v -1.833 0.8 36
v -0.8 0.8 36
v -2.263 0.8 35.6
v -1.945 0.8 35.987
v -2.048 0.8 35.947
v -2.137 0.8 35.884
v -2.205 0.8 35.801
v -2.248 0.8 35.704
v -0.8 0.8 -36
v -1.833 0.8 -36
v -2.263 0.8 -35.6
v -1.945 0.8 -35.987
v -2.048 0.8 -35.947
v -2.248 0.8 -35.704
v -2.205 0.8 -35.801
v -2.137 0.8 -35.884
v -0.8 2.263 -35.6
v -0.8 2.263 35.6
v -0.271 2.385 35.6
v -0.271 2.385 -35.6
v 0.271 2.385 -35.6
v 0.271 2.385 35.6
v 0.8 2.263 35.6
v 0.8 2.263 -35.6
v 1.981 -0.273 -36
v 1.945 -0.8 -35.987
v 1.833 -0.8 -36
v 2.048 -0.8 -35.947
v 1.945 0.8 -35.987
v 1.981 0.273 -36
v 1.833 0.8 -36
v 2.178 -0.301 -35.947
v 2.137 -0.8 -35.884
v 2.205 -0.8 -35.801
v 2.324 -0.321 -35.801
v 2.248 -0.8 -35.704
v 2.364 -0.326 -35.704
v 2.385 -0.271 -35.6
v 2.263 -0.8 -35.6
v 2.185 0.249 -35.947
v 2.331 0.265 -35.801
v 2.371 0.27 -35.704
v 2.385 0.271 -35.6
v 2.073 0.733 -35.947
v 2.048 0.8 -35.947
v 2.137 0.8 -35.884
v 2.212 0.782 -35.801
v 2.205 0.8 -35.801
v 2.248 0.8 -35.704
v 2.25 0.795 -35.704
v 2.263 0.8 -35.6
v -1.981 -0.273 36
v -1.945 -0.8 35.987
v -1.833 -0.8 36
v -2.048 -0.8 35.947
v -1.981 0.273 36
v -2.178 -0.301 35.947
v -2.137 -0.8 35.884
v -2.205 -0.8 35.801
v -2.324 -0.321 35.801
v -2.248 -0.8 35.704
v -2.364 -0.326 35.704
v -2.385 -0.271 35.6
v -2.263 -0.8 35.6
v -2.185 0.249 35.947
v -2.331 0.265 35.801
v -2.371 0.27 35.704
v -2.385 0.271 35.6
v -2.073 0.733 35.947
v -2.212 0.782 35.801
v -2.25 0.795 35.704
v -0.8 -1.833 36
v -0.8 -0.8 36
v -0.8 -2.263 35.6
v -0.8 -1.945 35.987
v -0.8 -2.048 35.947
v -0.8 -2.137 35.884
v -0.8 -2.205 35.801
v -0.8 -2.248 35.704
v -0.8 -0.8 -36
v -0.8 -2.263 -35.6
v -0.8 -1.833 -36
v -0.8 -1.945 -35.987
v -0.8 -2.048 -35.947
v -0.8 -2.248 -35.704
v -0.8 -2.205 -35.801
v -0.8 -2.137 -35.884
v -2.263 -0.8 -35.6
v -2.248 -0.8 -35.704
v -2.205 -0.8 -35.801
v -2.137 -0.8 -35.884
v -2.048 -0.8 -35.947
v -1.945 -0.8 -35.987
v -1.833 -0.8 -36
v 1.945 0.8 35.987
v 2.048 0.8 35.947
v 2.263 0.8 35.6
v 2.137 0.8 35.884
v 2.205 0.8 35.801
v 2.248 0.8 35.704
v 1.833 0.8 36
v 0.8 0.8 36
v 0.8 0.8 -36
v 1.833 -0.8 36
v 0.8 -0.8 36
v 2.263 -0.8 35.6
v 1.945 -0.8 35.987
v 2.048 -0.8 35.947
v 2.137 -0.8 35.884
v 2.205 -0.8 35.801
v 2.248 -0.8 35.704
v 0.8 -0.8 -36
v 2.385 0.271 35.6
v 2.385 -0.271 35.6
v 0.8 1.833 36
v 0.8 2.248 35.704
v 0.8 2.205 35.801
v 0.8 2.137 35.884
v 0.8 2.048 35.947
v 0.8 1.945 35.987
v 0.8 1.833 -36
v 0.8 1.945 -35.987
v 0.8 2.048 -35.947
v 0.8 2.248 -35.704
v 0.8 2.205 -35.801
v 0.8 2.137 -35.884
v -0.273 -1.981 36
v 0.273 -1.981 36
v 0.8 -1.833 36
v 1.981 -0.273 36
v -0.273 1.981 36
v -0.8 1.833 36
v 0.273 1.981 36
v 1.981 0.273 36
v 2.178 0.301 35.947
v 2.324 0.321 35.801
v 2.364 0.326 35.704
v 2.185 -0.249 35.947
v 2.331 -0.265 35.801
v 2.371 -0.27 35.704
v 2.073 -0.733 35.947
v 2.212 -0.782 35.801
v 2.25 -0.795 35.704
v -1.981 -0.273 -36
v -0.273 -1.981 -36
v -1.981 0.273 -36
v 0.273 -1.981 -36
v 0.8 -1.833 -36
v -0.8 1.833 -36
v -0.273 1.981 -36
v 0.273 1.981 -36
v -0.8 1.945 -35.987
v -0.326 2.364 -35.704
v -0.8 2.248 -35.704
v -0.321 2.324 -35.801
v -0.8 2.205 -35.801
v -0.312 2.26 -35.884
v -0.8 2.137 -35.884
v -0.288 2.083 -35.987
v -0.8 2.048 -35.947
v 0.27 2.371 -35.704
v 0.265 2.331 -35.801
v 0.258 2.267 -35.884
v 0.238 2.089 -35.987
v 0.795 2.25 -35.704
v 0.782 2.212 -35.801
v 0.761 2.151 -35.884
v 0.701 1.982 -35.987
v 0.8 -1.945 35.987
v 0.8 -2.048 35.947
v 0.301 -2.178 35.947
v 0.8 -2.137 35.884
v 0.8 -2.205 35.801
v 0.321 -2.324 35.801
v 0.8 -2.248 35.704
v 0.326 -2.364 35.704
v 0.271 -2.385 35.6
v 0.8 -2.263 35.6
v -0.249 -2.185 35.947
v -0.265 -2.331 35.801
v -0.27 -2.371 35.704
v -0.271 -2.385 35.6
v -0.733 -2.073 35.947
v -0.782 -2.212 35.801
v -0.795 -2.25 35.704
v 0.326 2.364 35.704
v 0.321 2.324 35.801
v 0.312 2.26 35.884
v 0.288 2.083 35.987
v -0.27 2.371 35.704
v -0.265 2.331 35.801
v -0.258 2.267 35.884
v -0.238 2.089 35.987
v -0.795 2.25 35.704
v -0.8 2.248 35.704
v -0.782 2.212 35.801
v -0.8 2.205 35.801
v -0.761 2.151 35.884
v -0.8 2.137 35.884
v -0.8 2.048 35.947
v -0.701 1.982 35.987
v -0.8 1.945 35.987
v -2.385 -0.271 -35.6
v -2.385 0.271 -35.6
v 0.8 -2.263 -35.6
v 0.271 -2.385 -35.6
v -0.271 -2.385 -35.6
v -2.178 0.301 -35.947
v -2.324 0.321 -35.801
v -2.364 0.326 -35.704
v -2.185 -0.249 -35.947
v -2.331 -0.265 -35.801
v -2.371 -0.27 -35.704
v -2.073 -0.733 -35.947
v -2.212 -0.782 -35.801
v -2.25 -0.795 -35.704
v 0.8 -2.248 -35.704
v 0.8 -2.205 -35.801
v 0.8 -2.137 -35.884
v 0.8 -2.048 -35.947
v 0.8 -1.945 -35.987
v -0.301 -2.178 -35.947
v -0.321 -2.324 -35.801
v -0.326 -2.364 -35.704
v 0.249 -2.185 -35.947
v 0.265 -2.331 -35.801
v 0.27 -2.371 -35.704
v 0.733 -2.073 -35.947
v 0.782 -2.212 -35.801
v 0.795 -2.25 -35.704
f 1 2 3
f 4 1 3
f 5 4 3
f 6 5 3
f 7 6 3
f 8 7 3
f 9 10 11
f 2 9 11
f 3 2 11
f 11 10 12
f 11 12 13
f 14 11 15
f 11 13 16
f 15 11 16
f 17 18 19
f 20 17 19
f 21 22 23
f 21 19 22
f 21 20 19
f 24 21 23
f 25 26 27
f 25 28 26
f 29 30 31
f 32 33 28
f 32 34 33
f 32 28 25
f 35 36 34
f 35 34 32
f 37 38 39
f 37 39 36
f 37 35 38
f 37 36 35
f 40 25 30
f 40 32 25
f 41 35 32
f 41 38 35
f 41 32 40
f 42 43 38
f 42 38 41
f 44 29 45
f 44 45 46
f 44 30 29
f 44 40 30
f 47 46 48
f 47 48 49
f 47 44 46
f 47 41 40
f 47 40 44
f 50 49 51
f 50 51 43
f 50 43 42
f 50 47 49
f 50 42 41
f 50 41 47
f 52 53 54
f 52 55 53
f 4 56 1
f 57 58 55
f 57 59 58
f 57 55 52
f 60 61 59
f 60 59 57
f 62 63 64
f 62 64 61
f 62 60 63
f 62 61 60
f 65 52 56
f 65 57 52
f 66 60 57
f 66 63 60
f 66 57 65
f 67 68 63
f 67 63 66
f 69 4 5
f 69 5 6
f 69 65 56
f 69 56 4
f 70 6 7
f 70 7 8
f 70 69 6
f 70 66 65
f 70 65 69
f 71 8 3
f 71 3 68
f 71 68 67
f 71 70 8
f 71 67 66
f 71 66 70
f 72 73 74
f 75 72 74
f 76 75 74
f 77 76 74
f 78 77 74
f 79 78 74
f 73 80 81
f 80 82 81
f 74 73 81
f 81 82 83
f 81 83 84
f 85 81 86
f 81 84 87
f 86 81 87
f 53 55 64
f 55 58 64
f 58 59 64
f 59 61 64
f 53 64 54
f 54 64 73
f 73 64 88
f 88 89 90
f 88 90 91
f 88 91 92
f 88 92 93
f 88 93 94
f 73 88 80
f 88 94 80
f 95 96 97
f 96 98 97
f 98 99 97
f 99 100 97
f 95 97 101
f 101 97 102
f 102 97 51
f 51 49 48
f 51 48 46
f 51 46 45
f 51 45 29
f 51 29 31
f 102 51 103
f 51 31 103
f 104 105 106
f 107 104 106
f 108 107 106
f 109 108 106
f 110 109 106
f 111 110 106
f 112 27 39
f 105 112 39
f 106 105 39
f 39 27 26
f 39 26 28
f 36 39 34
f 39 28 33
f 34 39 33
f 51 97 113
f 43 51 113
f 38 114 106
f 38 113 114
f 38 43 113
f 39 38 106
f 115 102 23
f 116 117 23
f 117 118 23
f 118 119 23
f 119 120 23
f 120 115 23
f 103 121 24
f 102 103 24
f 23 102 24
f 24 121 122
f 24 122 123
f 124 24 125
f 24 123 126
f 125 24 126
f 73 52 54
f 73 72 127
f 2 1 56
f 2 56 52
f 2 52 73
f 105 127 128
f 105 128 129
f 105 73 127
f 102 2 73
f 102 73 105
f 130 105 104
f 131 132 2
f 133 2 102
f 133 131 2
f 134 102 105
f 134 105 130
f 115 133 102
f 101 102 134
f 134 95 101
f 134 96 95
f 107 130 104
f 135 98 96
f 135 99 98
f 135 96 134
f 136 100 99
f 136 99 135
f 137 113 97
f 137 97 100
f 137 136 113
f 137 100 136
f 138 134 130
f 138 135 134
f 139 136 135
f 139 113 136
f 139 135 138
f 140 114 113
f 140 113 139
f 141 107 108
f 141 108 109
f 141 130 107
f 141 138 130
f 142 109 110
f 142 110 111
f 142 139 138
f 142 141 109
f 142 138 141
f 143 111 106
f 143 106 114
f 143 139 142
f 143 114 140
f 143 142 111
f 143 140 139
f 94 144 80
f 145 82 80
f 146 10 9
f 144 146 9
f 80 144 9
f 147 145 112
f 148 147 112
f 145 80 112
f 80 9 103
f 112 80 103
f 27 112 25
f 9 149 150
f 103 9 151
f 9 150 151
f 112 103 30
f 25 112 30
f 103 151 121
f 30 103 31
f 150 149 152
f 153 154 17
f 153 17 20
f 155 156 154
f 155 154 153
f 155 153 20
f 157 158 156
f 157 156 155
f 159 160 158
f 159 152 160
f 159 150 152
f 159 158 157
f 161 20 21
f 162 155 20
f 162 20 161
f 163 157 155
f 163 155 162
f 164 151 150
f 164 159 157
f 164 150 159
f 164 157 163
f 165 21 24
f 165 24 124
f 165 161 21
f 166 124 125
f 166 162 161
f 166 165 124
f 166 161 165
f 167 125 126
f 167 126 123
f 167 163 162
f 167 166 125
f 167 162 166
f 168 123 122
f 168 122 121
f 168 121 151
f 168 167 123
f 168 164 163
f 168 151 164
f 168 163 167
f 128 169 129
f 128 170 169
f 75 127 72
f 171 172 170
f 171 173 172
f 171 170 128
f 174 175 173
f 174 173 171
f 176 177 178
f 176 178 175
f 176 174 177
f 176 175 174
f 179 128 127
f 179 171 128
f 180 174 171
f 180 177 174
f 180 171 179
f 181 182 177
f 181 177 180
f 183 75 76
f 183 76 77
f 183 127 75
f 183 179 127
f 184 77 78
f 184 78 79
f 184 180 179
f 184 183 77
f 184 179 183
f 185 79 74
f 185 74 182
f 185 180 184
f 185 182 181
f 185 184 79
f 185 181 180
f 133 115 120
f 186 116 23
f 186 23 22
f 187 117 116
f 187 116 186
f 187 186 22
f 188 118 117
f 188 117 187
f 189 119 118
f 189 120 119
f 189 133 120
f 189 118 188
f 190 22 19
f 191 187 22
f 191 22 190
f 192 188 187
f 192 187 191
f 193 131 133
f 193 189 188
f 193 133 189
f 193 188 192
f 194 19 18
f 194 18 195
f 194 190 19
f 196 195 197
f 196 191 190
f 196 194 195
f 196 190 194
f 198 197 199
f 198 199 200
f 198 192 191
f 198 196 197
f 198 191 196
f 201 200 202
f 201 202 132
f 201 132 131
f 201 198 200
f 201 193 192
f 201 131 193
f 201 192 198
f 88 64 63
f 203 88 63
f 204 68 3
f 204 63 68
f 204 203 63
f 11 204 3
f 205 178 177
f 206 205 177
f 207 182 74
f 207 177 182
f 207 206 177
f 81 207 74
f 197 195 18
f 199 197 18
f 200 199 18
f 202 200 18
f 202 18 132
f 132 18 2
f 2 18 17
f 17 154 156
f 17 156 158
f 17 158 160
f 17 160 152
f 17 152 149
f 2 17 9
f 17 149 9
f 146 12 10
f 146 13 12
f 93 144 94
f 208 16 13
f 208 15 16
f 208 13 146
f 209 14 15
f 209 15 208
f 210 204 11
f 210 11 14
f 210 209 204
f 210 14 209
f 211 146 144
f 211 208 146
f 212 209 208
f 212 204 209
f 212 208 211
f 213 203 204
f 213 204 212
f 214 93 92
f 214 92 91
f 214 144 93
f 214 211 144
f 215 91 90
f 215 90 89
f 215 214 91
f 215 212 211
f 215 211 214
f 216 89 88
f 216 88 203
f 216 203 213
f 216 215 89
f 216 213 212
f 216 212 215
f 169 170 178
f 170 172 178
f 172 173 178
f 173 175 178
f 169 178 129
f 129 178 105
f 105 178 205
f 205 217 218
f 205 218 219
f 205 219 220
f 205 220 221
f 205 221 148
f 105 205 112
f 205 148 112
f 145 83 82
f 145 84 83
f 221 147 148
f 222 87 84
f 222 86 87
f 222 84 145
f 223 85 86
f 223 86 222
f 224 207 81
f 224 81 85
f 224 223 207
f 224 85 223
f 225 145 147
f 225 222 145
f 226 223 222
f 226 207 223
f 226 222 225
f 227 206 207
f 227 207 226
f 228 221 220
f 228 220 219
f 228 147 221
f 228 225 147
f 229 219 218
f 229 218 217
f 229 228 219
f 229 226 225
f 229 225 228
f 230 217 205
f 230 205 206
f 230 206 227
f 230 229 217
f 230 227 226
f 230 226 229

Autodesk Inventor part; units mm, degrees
ref_plane "YZ Plane" through (0, 0, 0) normal (1, 0, 0) x (0, 1, 0)
ref_plane "XZ Plane" through (0, 0, 0) normal (0, 1, 0) x (-1, 0, 0)
ref_plane "XY Plane" through (0, 0, 0) normal (0, 0, 1) x (1, 0, 0)
sketch "Sketch1" plane through (0, 0, 0) normal (0, 0, 1) x (1, 0, 0)
  circle A0 centre (0, 0) radius 2.4 construction
  line L0 (-0.8, 2.2627) -> (-0.8, 0.8)
  line L1 (-0.8, 0.8) -> (-2.2627, 0.8)
  line L2 (-2.2627, -0.8) -> (-0.8, -0.8)
  line L3 (-0.8, -0.8) -> (-0.8, -2.2627)
  line L4 (0.8, -2.2627) -> (0.8, -0.8)
  line L5 (0.8, -0.8) -> (2.2627, -0.8)
  line L6 (2.2627, 0.8) -> (0.8, 0.8)
  line L7 (0.8, 0.8) -> (0.8, 2.2627)
  arc A1 (0.8, 2.2627) -> (-0.8, 2.2627) centre (0, 0) ccw
  arc A2 (-2.2627, 0.8) -> (-2.2627, -0.8) centre (0, 0) ccw
  arc A3 (-0.8, -2.2627) -> (0.8, -2.2627) centre (0, 0) ccw
  arc A4 (2.2627, -0.8) -> (2.2627, 0.8) centre (0, 0) ccw
  dimension "d0" = 4.8
  dimension "d1" = 1.6
extrude "Extrusion1" add sketch "Sketch1" along normal mid plane 72
fillet "Fillet1" radius 0.4 8 edges at (0, 2.4, 36) (-2.4, 0, 36) (0, -2.4, 36) (2.4, 0, 36) (2.4, 0, -36) (0, 2.4, -36) (-2.4, 0, -36) (0, -2.4, -36)
equation "\"d0\" = kd"
equation "\"d1\" = axlet"
equation "\"d2\" = 9 * lu"
equation "\"d4\" = tf"
equation "\"kd\" = 4.8"
equation "\"axlet\" = 1.6"
equation "\"lu\" = 8"
equation "\"tf\" = 0.4"
properties part number "60485-LtBluishGray" material "ABS Plastic"
